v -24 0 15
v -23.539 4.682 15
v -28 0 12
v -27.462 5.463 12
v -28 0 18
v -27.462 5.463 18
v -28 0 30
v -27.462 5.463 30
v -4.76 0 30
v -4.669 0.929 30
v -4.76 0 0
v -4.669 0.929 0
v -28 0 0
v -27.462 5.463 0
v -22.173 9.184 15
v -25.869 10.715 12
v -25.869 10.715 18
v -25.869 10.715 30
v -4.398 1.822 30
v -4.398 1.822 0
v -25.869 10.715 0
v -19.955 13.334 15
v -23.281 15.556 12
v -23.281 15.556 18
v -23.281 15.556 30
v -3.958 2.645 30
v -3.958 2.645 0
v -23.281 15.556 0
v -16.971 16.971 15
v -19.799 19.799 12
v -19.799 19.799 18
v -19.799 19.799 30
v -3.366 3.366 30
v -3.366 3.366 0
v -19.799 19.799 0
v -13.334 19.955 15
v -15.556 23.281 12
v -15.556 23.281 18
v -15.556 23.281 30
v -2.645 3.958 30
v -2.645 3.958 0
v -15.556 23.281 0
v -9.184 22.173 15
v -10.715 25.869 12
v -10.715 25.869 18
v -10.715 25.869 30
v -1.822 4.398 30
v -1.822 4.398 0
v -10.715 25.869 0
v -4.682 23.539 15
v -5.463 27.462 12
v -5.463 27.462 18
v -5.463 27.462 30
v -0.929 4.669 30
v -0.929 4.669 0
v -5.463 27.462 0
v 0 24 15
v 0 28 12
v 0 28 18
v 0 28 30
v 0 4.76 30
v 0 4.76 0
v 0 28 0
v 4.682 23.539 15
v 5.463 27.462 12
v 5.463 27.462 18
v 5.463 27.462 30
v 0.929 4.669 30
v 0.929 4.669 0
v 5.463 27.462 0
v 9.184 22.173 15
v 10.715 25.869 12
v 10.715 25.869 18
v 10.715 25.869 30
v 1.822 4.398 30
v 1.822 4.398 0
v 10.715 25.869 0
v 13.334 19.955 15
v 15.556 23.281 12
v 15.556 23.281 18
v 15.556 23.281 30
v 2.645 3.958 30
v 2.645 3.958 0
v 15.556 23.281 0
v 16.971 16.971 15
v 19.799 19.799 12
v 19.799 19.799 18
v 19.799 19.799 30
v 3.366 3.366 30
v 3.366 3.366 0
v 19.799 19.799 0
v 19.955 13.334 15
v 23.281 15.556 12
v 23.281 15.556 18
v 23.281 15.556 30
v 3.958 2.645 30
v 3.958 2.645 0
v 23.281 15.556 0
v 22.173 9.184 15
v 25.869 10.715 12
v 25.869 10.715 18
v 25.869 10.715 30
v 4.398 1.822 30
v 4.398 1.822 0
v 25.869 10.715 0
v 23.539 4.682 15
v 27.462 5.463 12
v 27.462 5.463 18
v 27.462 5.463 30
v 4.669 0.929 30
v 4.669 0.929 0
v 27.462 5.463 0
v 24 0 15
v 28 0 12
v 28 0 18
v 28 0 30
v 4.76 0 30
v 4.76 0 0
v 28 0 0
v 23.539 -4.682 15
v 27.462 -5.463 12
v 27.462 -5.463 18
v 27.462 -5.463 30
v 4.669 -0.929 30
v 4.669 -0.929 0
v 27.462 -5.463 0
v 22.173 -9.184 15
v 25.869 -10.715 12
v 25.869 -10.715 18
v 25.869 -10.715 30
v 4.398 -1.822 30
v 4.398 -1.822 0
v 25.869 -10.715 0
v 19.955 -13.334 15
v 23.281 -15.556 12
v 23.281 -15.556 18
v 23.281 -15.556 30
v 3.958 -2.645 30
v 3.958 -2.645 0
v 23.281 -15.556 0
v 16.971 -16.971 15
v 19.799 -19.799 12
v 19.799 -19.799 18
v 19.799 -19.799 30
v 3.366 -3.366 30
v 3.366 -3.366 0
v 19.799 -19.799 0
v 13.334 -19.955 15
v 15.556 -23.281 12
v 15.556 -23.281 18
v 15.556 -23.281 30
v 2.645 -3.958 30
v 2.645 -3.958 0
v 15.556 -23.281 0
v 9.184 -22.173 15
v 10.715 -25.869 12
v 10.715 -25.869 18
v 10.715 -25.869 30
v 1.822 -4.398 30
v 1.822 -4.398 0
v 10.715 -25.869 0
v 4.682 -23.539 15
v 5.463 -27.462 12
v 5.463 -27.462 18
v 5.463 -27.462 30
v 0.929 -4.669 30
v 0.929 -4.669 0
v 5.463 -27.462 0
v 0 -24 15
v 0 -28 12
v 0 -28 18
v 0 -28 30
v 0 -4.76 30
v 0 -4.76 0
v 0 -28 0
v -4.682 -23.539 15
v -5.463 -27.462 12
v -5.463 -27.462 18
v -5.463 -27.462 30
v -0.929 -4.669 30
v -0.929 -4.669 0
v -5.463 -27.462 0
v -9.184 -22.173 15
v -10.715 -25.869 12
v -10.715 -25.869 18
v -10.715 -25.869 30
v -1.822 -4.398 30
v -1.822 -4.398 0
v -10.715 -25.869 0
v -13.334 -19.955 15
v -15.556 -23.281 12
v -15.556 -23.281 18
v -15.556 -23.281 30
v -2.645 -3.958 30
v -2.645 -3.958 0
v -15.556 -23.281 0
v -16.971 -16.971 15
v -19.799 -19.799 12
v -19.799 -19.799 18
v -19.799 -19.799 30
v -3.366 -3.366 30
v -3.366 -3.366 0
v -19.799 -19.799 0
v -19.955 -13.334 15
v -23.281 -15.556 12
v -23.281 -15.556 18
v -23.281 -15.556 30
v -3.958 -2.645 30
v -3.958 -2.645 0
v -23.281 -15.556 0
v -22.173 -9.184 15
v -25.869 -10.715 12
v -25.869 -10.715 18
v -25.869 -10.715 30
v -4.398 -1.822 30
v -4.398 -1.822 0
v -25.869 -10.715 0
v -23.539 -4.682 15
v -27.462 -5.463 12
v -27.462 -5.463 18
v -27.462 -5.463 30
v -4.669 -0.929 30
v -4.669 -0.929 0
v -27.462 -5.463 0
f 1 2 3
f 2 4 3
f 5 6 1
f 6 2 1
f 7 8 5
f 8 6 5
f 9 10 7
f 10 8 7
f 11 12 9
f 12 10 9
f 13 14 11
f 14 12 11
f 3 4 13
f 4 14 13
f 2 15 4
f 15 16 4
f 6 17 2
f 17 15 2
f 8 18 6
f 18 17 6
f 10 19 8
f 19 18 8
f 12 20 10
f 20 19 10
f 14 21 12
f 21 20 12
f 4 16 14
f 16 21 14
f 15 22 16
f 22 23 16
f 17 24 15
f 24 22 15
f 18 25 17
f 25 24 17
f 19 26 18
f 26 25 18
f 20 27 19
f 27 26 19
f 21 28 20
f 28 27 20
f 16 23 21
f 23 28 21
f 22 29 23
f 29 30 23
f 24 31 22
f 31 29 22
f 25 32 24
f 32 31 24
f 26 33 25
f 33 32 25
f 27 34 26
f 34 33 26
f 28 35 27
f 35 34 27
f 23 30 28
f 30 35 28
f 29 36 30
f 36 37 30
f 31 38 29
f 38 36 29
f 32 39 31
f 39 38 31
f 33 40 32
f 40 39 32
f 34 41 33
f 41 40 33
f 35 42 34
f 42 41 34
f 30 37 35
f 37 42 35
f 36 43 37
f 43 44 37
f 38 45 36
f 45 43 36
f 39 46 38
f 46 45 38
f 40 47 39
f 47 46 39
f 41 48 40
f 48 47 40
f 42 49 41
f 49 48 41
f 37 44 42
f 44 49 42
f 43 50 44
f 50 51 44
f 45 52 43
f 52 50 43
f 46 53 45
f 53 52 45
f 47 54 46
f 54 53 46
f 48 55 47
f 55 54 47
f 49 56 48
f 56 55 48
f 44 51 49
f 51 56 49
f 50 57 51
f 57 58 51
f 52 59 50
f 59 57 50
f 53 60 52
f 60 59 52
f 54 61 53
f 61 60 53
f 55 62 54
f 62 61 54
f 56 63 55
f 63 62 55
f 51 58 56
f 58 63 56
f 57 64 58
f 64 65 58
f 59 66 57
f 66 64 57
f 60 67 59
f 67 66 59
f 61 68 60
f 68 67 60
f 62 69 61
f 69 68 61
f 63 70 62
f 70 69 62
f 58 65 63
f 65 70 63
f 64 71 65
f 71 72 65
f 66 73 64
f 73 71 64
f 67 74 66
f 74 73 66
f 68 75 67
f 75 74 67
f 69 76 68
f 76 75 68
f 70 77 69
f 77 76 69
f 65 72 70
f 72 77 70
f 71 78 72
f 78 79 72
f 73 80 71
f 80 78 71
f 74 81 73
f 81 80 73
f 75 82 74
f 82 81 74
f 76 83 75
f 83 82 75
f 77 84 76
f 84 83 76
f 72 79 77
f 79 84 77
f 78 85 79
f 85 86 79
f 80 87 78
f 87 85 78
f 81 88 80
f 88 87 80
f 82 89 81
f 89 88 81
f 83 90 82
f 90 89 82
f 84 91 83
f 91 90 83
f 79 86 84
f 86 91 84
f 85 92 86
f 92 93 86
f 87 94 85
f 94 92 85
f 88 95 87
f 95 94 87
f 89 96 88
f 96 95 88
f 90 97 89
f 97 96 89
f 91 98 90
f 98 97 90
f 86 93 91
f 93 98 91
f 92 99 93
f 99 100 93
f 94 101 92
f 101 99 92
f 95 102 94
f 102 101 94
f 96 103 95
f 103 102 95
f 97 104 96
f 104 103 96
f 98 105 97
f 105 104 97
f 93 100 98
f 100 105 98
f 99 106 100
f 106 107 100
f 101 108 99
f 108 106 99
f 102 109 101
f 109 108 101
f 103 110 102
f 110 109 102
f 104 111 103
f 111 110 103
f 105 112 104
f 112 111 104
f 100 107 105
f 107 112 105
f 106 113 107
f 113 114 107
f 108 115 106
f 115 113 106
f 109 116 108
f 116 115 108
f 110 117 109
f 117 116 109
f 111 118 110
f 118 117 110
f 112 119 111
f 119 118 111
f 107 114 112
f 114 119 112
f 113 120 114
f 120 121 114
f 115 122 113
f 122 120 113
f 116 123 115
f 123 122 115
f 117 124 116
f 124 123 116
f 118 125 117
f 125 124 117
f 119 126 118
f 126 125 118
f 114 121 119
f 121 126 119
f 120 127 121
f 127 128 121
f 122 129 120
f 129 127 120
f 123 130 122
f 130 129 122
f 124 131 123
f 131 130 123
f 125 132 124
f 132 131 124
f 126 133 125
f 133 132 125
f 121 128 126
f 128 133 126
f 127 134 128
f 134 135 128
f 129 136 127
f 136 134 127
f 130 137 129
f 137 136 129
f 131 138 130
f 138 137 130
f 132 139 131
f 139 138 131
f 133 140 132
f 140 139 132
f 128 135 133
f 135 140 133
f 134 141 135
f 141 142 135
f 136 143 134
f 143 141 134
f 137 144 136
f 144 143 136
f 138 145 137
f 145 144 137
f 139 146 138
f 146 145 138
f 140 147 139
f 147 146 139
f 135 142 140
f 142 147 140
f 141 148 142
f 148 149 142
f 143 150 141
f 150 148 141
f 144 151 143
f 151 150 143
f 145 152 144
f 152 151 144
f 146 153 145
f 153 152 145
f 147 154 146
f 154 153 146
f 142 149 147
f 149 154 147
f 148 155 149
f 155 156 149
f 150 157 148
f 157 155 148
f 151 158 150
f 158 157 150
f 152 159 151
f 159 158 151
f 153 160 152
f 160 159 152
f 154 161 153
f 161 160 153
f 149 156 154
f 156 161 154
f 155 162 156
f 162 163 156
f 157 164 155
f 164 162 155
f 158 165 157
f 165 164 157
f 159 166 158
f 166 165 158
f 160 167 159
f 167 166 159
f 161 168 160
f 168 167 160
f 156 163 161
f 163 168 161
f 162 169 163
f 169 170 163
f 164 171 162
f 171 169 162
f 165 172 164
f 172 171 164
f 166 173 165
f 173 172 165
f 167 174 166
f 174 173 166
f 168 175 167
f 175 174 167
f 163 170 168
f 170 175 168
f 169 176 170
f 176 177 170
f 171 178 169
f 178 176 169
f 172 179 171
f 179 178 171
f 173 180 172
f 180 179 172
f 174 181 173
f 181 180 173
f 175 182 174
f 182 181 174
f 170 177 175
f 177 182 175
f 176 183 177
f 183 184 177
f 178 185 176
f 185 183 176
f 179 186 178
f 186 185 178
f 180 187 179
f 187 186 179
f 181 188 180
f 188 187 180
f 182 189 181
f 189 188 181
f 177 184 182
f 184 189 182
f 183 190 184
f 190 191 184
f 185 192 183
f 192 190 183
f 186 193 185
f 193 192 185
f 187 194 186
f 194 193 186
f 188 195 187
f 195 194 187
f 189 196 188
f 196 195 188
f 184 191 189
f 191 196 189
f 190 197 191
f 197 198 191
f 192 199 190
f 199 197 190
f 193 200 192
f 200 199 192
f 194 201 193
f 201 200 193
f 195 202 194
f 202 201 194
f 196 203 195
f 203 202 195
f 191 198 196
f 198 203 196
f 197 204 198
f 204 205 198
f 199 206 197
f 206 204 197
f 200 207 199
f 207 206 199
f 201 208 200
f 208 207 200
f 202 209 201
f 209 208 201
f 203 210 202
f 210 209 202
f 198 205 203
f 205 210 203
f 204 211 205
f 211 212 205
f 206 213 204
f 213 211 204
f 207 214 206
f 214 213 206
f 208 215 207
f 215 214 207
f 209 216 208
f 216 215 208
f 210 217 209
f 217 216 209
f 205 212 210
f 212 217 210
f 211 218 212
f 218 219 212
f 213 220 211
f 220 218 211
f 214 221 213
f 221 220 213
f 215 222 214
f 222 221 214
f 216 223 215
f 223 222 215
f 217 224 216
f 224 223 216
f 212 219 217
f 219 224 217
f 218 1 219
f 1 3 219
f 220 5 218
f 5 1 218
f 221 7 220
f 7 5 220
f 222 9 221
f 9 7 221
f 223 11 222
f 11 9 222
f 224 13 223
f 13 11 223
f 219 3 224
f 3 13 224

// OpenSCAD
$fn = 32;

// ----------------------------------------------------------------------
// Belt roller: 56 mm barrel, 30 mm wide, bore 9.52 mm
// ----------------------------------------------------------------------

// --- parameters (mm) ---
bore_d = 9.52;            // bore
barrel_d = 56;            // barrel diameter
roller_w = 30;            // roller width
groove_w = 6;             // guide groove width
groove_d = 4;             // guide groove depth

roller_profile = [[4.76, 0], [28, 0], [28, 12], [24, 15], [28, 18], [28, 30], [4.76, 30]];

/* the profile stays clear of the axis, so the bore comes out of the revolve */
rotate_extrude() polygon(roller_profile);
